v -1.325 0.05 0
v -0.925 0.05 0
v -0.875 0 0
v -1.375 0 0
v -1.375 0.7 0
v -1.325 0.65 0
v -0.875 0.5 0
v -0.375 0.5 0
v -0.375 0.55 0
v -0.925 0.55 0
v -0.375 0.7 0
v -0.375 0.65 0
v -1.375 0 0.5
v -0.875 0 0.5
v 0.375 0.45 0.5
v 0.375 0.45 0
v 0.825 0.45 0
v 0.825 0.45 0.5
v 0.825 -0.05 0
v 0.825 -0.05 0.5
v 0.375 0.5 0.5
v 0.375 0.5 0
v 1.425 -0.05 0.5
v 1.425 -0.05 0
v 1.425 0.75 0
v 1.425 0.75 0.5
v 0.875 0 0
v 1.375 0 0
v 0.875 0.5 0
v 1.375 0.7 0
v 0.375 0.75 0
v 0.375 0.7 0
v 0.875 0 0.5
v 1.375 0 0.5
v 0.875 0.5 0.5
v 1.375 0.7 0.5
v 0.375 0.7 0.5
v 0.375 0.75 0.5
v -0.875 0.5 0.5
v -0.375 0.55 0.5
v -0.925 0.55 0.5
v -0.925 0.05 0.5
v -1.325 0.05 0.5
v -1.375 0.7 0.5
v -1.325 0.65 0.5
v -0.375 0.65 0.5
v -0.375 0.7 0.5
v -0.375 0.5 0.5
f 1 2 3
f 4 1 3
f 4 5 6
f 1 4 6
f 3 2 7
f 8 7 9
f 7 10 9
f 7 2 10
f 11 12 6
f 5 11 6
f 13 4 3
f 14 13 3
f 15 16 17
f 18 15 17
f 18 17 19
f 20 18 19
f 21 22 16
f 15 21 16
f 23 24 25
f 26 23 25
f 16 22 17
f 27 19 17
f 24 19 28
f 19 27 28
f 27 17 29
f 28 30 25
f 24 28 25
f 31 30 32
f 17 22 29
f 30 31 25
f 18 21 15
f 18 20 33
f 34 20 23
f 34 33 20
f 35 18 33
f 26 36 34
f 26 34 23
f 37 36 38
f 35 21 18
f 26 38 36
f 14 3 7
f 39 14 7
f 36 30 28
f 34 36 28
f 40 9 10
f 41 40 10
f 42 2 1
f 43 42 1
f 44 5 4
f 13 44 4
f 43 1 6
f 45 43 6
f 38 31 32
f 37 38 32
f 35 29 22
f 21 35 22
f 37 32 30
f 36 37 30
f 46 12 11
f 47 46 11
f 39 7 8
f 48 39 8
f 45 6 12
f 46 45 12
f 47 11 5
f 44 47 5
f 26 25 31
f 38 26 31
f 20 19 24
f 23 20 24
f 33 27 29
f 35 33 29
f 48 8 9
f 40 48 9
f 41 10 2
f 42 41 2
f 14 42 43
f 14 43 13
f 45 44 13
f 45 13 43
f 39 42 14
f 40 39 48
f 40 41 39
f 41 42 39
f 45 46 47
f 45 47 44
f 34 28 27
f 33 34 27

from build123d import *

# Parameters (mm, degrees)
EXTRUDE_THIN2_DEPTH   = 0.5
EXTRUDE_THIN2_2_DEPTH = 0.5


with BuildPart() as part:
    # Sketch2 → Extrude-Thin2 (new body)
    with BuildSketch(Plane.XY):
        Polygon((-0.375, 0.7), (-1.375, 0.7), (-1.375, 0), (-0.875, 0), (-0.875, 0.5), (-0.375, 0.5), (-0.375, 0.55), (-0.925, 0.55), (-0.925, 0.05), (-1.325, 0.05), (-1.325, 0.65), (-0.375, 0.65), align=None)
    extrude(amount=EXTRUDE_THIN2_DEPTH)


with BuildPart() as body_2:
    # Sketch2 → Extrude-Thin2 2 (new body)
    with BuildSketch(Plane.XY):
        Polygon((0.375, 0.7), (1.375, 0.7), (1.375, 0), (0.875, 0), (0.875, 0.5), (0.375, 0.5), (0.375, 0.45), (0.825, 0.45), (0.825, -0.05), (1.425, -0.05), (1.425, 0.75), (0.375, 0.75), align=None)
    extrude(amount=EXTRUDE_THIN2_2_DEPTH)


solid = Compound([part.part, body_2.part])
